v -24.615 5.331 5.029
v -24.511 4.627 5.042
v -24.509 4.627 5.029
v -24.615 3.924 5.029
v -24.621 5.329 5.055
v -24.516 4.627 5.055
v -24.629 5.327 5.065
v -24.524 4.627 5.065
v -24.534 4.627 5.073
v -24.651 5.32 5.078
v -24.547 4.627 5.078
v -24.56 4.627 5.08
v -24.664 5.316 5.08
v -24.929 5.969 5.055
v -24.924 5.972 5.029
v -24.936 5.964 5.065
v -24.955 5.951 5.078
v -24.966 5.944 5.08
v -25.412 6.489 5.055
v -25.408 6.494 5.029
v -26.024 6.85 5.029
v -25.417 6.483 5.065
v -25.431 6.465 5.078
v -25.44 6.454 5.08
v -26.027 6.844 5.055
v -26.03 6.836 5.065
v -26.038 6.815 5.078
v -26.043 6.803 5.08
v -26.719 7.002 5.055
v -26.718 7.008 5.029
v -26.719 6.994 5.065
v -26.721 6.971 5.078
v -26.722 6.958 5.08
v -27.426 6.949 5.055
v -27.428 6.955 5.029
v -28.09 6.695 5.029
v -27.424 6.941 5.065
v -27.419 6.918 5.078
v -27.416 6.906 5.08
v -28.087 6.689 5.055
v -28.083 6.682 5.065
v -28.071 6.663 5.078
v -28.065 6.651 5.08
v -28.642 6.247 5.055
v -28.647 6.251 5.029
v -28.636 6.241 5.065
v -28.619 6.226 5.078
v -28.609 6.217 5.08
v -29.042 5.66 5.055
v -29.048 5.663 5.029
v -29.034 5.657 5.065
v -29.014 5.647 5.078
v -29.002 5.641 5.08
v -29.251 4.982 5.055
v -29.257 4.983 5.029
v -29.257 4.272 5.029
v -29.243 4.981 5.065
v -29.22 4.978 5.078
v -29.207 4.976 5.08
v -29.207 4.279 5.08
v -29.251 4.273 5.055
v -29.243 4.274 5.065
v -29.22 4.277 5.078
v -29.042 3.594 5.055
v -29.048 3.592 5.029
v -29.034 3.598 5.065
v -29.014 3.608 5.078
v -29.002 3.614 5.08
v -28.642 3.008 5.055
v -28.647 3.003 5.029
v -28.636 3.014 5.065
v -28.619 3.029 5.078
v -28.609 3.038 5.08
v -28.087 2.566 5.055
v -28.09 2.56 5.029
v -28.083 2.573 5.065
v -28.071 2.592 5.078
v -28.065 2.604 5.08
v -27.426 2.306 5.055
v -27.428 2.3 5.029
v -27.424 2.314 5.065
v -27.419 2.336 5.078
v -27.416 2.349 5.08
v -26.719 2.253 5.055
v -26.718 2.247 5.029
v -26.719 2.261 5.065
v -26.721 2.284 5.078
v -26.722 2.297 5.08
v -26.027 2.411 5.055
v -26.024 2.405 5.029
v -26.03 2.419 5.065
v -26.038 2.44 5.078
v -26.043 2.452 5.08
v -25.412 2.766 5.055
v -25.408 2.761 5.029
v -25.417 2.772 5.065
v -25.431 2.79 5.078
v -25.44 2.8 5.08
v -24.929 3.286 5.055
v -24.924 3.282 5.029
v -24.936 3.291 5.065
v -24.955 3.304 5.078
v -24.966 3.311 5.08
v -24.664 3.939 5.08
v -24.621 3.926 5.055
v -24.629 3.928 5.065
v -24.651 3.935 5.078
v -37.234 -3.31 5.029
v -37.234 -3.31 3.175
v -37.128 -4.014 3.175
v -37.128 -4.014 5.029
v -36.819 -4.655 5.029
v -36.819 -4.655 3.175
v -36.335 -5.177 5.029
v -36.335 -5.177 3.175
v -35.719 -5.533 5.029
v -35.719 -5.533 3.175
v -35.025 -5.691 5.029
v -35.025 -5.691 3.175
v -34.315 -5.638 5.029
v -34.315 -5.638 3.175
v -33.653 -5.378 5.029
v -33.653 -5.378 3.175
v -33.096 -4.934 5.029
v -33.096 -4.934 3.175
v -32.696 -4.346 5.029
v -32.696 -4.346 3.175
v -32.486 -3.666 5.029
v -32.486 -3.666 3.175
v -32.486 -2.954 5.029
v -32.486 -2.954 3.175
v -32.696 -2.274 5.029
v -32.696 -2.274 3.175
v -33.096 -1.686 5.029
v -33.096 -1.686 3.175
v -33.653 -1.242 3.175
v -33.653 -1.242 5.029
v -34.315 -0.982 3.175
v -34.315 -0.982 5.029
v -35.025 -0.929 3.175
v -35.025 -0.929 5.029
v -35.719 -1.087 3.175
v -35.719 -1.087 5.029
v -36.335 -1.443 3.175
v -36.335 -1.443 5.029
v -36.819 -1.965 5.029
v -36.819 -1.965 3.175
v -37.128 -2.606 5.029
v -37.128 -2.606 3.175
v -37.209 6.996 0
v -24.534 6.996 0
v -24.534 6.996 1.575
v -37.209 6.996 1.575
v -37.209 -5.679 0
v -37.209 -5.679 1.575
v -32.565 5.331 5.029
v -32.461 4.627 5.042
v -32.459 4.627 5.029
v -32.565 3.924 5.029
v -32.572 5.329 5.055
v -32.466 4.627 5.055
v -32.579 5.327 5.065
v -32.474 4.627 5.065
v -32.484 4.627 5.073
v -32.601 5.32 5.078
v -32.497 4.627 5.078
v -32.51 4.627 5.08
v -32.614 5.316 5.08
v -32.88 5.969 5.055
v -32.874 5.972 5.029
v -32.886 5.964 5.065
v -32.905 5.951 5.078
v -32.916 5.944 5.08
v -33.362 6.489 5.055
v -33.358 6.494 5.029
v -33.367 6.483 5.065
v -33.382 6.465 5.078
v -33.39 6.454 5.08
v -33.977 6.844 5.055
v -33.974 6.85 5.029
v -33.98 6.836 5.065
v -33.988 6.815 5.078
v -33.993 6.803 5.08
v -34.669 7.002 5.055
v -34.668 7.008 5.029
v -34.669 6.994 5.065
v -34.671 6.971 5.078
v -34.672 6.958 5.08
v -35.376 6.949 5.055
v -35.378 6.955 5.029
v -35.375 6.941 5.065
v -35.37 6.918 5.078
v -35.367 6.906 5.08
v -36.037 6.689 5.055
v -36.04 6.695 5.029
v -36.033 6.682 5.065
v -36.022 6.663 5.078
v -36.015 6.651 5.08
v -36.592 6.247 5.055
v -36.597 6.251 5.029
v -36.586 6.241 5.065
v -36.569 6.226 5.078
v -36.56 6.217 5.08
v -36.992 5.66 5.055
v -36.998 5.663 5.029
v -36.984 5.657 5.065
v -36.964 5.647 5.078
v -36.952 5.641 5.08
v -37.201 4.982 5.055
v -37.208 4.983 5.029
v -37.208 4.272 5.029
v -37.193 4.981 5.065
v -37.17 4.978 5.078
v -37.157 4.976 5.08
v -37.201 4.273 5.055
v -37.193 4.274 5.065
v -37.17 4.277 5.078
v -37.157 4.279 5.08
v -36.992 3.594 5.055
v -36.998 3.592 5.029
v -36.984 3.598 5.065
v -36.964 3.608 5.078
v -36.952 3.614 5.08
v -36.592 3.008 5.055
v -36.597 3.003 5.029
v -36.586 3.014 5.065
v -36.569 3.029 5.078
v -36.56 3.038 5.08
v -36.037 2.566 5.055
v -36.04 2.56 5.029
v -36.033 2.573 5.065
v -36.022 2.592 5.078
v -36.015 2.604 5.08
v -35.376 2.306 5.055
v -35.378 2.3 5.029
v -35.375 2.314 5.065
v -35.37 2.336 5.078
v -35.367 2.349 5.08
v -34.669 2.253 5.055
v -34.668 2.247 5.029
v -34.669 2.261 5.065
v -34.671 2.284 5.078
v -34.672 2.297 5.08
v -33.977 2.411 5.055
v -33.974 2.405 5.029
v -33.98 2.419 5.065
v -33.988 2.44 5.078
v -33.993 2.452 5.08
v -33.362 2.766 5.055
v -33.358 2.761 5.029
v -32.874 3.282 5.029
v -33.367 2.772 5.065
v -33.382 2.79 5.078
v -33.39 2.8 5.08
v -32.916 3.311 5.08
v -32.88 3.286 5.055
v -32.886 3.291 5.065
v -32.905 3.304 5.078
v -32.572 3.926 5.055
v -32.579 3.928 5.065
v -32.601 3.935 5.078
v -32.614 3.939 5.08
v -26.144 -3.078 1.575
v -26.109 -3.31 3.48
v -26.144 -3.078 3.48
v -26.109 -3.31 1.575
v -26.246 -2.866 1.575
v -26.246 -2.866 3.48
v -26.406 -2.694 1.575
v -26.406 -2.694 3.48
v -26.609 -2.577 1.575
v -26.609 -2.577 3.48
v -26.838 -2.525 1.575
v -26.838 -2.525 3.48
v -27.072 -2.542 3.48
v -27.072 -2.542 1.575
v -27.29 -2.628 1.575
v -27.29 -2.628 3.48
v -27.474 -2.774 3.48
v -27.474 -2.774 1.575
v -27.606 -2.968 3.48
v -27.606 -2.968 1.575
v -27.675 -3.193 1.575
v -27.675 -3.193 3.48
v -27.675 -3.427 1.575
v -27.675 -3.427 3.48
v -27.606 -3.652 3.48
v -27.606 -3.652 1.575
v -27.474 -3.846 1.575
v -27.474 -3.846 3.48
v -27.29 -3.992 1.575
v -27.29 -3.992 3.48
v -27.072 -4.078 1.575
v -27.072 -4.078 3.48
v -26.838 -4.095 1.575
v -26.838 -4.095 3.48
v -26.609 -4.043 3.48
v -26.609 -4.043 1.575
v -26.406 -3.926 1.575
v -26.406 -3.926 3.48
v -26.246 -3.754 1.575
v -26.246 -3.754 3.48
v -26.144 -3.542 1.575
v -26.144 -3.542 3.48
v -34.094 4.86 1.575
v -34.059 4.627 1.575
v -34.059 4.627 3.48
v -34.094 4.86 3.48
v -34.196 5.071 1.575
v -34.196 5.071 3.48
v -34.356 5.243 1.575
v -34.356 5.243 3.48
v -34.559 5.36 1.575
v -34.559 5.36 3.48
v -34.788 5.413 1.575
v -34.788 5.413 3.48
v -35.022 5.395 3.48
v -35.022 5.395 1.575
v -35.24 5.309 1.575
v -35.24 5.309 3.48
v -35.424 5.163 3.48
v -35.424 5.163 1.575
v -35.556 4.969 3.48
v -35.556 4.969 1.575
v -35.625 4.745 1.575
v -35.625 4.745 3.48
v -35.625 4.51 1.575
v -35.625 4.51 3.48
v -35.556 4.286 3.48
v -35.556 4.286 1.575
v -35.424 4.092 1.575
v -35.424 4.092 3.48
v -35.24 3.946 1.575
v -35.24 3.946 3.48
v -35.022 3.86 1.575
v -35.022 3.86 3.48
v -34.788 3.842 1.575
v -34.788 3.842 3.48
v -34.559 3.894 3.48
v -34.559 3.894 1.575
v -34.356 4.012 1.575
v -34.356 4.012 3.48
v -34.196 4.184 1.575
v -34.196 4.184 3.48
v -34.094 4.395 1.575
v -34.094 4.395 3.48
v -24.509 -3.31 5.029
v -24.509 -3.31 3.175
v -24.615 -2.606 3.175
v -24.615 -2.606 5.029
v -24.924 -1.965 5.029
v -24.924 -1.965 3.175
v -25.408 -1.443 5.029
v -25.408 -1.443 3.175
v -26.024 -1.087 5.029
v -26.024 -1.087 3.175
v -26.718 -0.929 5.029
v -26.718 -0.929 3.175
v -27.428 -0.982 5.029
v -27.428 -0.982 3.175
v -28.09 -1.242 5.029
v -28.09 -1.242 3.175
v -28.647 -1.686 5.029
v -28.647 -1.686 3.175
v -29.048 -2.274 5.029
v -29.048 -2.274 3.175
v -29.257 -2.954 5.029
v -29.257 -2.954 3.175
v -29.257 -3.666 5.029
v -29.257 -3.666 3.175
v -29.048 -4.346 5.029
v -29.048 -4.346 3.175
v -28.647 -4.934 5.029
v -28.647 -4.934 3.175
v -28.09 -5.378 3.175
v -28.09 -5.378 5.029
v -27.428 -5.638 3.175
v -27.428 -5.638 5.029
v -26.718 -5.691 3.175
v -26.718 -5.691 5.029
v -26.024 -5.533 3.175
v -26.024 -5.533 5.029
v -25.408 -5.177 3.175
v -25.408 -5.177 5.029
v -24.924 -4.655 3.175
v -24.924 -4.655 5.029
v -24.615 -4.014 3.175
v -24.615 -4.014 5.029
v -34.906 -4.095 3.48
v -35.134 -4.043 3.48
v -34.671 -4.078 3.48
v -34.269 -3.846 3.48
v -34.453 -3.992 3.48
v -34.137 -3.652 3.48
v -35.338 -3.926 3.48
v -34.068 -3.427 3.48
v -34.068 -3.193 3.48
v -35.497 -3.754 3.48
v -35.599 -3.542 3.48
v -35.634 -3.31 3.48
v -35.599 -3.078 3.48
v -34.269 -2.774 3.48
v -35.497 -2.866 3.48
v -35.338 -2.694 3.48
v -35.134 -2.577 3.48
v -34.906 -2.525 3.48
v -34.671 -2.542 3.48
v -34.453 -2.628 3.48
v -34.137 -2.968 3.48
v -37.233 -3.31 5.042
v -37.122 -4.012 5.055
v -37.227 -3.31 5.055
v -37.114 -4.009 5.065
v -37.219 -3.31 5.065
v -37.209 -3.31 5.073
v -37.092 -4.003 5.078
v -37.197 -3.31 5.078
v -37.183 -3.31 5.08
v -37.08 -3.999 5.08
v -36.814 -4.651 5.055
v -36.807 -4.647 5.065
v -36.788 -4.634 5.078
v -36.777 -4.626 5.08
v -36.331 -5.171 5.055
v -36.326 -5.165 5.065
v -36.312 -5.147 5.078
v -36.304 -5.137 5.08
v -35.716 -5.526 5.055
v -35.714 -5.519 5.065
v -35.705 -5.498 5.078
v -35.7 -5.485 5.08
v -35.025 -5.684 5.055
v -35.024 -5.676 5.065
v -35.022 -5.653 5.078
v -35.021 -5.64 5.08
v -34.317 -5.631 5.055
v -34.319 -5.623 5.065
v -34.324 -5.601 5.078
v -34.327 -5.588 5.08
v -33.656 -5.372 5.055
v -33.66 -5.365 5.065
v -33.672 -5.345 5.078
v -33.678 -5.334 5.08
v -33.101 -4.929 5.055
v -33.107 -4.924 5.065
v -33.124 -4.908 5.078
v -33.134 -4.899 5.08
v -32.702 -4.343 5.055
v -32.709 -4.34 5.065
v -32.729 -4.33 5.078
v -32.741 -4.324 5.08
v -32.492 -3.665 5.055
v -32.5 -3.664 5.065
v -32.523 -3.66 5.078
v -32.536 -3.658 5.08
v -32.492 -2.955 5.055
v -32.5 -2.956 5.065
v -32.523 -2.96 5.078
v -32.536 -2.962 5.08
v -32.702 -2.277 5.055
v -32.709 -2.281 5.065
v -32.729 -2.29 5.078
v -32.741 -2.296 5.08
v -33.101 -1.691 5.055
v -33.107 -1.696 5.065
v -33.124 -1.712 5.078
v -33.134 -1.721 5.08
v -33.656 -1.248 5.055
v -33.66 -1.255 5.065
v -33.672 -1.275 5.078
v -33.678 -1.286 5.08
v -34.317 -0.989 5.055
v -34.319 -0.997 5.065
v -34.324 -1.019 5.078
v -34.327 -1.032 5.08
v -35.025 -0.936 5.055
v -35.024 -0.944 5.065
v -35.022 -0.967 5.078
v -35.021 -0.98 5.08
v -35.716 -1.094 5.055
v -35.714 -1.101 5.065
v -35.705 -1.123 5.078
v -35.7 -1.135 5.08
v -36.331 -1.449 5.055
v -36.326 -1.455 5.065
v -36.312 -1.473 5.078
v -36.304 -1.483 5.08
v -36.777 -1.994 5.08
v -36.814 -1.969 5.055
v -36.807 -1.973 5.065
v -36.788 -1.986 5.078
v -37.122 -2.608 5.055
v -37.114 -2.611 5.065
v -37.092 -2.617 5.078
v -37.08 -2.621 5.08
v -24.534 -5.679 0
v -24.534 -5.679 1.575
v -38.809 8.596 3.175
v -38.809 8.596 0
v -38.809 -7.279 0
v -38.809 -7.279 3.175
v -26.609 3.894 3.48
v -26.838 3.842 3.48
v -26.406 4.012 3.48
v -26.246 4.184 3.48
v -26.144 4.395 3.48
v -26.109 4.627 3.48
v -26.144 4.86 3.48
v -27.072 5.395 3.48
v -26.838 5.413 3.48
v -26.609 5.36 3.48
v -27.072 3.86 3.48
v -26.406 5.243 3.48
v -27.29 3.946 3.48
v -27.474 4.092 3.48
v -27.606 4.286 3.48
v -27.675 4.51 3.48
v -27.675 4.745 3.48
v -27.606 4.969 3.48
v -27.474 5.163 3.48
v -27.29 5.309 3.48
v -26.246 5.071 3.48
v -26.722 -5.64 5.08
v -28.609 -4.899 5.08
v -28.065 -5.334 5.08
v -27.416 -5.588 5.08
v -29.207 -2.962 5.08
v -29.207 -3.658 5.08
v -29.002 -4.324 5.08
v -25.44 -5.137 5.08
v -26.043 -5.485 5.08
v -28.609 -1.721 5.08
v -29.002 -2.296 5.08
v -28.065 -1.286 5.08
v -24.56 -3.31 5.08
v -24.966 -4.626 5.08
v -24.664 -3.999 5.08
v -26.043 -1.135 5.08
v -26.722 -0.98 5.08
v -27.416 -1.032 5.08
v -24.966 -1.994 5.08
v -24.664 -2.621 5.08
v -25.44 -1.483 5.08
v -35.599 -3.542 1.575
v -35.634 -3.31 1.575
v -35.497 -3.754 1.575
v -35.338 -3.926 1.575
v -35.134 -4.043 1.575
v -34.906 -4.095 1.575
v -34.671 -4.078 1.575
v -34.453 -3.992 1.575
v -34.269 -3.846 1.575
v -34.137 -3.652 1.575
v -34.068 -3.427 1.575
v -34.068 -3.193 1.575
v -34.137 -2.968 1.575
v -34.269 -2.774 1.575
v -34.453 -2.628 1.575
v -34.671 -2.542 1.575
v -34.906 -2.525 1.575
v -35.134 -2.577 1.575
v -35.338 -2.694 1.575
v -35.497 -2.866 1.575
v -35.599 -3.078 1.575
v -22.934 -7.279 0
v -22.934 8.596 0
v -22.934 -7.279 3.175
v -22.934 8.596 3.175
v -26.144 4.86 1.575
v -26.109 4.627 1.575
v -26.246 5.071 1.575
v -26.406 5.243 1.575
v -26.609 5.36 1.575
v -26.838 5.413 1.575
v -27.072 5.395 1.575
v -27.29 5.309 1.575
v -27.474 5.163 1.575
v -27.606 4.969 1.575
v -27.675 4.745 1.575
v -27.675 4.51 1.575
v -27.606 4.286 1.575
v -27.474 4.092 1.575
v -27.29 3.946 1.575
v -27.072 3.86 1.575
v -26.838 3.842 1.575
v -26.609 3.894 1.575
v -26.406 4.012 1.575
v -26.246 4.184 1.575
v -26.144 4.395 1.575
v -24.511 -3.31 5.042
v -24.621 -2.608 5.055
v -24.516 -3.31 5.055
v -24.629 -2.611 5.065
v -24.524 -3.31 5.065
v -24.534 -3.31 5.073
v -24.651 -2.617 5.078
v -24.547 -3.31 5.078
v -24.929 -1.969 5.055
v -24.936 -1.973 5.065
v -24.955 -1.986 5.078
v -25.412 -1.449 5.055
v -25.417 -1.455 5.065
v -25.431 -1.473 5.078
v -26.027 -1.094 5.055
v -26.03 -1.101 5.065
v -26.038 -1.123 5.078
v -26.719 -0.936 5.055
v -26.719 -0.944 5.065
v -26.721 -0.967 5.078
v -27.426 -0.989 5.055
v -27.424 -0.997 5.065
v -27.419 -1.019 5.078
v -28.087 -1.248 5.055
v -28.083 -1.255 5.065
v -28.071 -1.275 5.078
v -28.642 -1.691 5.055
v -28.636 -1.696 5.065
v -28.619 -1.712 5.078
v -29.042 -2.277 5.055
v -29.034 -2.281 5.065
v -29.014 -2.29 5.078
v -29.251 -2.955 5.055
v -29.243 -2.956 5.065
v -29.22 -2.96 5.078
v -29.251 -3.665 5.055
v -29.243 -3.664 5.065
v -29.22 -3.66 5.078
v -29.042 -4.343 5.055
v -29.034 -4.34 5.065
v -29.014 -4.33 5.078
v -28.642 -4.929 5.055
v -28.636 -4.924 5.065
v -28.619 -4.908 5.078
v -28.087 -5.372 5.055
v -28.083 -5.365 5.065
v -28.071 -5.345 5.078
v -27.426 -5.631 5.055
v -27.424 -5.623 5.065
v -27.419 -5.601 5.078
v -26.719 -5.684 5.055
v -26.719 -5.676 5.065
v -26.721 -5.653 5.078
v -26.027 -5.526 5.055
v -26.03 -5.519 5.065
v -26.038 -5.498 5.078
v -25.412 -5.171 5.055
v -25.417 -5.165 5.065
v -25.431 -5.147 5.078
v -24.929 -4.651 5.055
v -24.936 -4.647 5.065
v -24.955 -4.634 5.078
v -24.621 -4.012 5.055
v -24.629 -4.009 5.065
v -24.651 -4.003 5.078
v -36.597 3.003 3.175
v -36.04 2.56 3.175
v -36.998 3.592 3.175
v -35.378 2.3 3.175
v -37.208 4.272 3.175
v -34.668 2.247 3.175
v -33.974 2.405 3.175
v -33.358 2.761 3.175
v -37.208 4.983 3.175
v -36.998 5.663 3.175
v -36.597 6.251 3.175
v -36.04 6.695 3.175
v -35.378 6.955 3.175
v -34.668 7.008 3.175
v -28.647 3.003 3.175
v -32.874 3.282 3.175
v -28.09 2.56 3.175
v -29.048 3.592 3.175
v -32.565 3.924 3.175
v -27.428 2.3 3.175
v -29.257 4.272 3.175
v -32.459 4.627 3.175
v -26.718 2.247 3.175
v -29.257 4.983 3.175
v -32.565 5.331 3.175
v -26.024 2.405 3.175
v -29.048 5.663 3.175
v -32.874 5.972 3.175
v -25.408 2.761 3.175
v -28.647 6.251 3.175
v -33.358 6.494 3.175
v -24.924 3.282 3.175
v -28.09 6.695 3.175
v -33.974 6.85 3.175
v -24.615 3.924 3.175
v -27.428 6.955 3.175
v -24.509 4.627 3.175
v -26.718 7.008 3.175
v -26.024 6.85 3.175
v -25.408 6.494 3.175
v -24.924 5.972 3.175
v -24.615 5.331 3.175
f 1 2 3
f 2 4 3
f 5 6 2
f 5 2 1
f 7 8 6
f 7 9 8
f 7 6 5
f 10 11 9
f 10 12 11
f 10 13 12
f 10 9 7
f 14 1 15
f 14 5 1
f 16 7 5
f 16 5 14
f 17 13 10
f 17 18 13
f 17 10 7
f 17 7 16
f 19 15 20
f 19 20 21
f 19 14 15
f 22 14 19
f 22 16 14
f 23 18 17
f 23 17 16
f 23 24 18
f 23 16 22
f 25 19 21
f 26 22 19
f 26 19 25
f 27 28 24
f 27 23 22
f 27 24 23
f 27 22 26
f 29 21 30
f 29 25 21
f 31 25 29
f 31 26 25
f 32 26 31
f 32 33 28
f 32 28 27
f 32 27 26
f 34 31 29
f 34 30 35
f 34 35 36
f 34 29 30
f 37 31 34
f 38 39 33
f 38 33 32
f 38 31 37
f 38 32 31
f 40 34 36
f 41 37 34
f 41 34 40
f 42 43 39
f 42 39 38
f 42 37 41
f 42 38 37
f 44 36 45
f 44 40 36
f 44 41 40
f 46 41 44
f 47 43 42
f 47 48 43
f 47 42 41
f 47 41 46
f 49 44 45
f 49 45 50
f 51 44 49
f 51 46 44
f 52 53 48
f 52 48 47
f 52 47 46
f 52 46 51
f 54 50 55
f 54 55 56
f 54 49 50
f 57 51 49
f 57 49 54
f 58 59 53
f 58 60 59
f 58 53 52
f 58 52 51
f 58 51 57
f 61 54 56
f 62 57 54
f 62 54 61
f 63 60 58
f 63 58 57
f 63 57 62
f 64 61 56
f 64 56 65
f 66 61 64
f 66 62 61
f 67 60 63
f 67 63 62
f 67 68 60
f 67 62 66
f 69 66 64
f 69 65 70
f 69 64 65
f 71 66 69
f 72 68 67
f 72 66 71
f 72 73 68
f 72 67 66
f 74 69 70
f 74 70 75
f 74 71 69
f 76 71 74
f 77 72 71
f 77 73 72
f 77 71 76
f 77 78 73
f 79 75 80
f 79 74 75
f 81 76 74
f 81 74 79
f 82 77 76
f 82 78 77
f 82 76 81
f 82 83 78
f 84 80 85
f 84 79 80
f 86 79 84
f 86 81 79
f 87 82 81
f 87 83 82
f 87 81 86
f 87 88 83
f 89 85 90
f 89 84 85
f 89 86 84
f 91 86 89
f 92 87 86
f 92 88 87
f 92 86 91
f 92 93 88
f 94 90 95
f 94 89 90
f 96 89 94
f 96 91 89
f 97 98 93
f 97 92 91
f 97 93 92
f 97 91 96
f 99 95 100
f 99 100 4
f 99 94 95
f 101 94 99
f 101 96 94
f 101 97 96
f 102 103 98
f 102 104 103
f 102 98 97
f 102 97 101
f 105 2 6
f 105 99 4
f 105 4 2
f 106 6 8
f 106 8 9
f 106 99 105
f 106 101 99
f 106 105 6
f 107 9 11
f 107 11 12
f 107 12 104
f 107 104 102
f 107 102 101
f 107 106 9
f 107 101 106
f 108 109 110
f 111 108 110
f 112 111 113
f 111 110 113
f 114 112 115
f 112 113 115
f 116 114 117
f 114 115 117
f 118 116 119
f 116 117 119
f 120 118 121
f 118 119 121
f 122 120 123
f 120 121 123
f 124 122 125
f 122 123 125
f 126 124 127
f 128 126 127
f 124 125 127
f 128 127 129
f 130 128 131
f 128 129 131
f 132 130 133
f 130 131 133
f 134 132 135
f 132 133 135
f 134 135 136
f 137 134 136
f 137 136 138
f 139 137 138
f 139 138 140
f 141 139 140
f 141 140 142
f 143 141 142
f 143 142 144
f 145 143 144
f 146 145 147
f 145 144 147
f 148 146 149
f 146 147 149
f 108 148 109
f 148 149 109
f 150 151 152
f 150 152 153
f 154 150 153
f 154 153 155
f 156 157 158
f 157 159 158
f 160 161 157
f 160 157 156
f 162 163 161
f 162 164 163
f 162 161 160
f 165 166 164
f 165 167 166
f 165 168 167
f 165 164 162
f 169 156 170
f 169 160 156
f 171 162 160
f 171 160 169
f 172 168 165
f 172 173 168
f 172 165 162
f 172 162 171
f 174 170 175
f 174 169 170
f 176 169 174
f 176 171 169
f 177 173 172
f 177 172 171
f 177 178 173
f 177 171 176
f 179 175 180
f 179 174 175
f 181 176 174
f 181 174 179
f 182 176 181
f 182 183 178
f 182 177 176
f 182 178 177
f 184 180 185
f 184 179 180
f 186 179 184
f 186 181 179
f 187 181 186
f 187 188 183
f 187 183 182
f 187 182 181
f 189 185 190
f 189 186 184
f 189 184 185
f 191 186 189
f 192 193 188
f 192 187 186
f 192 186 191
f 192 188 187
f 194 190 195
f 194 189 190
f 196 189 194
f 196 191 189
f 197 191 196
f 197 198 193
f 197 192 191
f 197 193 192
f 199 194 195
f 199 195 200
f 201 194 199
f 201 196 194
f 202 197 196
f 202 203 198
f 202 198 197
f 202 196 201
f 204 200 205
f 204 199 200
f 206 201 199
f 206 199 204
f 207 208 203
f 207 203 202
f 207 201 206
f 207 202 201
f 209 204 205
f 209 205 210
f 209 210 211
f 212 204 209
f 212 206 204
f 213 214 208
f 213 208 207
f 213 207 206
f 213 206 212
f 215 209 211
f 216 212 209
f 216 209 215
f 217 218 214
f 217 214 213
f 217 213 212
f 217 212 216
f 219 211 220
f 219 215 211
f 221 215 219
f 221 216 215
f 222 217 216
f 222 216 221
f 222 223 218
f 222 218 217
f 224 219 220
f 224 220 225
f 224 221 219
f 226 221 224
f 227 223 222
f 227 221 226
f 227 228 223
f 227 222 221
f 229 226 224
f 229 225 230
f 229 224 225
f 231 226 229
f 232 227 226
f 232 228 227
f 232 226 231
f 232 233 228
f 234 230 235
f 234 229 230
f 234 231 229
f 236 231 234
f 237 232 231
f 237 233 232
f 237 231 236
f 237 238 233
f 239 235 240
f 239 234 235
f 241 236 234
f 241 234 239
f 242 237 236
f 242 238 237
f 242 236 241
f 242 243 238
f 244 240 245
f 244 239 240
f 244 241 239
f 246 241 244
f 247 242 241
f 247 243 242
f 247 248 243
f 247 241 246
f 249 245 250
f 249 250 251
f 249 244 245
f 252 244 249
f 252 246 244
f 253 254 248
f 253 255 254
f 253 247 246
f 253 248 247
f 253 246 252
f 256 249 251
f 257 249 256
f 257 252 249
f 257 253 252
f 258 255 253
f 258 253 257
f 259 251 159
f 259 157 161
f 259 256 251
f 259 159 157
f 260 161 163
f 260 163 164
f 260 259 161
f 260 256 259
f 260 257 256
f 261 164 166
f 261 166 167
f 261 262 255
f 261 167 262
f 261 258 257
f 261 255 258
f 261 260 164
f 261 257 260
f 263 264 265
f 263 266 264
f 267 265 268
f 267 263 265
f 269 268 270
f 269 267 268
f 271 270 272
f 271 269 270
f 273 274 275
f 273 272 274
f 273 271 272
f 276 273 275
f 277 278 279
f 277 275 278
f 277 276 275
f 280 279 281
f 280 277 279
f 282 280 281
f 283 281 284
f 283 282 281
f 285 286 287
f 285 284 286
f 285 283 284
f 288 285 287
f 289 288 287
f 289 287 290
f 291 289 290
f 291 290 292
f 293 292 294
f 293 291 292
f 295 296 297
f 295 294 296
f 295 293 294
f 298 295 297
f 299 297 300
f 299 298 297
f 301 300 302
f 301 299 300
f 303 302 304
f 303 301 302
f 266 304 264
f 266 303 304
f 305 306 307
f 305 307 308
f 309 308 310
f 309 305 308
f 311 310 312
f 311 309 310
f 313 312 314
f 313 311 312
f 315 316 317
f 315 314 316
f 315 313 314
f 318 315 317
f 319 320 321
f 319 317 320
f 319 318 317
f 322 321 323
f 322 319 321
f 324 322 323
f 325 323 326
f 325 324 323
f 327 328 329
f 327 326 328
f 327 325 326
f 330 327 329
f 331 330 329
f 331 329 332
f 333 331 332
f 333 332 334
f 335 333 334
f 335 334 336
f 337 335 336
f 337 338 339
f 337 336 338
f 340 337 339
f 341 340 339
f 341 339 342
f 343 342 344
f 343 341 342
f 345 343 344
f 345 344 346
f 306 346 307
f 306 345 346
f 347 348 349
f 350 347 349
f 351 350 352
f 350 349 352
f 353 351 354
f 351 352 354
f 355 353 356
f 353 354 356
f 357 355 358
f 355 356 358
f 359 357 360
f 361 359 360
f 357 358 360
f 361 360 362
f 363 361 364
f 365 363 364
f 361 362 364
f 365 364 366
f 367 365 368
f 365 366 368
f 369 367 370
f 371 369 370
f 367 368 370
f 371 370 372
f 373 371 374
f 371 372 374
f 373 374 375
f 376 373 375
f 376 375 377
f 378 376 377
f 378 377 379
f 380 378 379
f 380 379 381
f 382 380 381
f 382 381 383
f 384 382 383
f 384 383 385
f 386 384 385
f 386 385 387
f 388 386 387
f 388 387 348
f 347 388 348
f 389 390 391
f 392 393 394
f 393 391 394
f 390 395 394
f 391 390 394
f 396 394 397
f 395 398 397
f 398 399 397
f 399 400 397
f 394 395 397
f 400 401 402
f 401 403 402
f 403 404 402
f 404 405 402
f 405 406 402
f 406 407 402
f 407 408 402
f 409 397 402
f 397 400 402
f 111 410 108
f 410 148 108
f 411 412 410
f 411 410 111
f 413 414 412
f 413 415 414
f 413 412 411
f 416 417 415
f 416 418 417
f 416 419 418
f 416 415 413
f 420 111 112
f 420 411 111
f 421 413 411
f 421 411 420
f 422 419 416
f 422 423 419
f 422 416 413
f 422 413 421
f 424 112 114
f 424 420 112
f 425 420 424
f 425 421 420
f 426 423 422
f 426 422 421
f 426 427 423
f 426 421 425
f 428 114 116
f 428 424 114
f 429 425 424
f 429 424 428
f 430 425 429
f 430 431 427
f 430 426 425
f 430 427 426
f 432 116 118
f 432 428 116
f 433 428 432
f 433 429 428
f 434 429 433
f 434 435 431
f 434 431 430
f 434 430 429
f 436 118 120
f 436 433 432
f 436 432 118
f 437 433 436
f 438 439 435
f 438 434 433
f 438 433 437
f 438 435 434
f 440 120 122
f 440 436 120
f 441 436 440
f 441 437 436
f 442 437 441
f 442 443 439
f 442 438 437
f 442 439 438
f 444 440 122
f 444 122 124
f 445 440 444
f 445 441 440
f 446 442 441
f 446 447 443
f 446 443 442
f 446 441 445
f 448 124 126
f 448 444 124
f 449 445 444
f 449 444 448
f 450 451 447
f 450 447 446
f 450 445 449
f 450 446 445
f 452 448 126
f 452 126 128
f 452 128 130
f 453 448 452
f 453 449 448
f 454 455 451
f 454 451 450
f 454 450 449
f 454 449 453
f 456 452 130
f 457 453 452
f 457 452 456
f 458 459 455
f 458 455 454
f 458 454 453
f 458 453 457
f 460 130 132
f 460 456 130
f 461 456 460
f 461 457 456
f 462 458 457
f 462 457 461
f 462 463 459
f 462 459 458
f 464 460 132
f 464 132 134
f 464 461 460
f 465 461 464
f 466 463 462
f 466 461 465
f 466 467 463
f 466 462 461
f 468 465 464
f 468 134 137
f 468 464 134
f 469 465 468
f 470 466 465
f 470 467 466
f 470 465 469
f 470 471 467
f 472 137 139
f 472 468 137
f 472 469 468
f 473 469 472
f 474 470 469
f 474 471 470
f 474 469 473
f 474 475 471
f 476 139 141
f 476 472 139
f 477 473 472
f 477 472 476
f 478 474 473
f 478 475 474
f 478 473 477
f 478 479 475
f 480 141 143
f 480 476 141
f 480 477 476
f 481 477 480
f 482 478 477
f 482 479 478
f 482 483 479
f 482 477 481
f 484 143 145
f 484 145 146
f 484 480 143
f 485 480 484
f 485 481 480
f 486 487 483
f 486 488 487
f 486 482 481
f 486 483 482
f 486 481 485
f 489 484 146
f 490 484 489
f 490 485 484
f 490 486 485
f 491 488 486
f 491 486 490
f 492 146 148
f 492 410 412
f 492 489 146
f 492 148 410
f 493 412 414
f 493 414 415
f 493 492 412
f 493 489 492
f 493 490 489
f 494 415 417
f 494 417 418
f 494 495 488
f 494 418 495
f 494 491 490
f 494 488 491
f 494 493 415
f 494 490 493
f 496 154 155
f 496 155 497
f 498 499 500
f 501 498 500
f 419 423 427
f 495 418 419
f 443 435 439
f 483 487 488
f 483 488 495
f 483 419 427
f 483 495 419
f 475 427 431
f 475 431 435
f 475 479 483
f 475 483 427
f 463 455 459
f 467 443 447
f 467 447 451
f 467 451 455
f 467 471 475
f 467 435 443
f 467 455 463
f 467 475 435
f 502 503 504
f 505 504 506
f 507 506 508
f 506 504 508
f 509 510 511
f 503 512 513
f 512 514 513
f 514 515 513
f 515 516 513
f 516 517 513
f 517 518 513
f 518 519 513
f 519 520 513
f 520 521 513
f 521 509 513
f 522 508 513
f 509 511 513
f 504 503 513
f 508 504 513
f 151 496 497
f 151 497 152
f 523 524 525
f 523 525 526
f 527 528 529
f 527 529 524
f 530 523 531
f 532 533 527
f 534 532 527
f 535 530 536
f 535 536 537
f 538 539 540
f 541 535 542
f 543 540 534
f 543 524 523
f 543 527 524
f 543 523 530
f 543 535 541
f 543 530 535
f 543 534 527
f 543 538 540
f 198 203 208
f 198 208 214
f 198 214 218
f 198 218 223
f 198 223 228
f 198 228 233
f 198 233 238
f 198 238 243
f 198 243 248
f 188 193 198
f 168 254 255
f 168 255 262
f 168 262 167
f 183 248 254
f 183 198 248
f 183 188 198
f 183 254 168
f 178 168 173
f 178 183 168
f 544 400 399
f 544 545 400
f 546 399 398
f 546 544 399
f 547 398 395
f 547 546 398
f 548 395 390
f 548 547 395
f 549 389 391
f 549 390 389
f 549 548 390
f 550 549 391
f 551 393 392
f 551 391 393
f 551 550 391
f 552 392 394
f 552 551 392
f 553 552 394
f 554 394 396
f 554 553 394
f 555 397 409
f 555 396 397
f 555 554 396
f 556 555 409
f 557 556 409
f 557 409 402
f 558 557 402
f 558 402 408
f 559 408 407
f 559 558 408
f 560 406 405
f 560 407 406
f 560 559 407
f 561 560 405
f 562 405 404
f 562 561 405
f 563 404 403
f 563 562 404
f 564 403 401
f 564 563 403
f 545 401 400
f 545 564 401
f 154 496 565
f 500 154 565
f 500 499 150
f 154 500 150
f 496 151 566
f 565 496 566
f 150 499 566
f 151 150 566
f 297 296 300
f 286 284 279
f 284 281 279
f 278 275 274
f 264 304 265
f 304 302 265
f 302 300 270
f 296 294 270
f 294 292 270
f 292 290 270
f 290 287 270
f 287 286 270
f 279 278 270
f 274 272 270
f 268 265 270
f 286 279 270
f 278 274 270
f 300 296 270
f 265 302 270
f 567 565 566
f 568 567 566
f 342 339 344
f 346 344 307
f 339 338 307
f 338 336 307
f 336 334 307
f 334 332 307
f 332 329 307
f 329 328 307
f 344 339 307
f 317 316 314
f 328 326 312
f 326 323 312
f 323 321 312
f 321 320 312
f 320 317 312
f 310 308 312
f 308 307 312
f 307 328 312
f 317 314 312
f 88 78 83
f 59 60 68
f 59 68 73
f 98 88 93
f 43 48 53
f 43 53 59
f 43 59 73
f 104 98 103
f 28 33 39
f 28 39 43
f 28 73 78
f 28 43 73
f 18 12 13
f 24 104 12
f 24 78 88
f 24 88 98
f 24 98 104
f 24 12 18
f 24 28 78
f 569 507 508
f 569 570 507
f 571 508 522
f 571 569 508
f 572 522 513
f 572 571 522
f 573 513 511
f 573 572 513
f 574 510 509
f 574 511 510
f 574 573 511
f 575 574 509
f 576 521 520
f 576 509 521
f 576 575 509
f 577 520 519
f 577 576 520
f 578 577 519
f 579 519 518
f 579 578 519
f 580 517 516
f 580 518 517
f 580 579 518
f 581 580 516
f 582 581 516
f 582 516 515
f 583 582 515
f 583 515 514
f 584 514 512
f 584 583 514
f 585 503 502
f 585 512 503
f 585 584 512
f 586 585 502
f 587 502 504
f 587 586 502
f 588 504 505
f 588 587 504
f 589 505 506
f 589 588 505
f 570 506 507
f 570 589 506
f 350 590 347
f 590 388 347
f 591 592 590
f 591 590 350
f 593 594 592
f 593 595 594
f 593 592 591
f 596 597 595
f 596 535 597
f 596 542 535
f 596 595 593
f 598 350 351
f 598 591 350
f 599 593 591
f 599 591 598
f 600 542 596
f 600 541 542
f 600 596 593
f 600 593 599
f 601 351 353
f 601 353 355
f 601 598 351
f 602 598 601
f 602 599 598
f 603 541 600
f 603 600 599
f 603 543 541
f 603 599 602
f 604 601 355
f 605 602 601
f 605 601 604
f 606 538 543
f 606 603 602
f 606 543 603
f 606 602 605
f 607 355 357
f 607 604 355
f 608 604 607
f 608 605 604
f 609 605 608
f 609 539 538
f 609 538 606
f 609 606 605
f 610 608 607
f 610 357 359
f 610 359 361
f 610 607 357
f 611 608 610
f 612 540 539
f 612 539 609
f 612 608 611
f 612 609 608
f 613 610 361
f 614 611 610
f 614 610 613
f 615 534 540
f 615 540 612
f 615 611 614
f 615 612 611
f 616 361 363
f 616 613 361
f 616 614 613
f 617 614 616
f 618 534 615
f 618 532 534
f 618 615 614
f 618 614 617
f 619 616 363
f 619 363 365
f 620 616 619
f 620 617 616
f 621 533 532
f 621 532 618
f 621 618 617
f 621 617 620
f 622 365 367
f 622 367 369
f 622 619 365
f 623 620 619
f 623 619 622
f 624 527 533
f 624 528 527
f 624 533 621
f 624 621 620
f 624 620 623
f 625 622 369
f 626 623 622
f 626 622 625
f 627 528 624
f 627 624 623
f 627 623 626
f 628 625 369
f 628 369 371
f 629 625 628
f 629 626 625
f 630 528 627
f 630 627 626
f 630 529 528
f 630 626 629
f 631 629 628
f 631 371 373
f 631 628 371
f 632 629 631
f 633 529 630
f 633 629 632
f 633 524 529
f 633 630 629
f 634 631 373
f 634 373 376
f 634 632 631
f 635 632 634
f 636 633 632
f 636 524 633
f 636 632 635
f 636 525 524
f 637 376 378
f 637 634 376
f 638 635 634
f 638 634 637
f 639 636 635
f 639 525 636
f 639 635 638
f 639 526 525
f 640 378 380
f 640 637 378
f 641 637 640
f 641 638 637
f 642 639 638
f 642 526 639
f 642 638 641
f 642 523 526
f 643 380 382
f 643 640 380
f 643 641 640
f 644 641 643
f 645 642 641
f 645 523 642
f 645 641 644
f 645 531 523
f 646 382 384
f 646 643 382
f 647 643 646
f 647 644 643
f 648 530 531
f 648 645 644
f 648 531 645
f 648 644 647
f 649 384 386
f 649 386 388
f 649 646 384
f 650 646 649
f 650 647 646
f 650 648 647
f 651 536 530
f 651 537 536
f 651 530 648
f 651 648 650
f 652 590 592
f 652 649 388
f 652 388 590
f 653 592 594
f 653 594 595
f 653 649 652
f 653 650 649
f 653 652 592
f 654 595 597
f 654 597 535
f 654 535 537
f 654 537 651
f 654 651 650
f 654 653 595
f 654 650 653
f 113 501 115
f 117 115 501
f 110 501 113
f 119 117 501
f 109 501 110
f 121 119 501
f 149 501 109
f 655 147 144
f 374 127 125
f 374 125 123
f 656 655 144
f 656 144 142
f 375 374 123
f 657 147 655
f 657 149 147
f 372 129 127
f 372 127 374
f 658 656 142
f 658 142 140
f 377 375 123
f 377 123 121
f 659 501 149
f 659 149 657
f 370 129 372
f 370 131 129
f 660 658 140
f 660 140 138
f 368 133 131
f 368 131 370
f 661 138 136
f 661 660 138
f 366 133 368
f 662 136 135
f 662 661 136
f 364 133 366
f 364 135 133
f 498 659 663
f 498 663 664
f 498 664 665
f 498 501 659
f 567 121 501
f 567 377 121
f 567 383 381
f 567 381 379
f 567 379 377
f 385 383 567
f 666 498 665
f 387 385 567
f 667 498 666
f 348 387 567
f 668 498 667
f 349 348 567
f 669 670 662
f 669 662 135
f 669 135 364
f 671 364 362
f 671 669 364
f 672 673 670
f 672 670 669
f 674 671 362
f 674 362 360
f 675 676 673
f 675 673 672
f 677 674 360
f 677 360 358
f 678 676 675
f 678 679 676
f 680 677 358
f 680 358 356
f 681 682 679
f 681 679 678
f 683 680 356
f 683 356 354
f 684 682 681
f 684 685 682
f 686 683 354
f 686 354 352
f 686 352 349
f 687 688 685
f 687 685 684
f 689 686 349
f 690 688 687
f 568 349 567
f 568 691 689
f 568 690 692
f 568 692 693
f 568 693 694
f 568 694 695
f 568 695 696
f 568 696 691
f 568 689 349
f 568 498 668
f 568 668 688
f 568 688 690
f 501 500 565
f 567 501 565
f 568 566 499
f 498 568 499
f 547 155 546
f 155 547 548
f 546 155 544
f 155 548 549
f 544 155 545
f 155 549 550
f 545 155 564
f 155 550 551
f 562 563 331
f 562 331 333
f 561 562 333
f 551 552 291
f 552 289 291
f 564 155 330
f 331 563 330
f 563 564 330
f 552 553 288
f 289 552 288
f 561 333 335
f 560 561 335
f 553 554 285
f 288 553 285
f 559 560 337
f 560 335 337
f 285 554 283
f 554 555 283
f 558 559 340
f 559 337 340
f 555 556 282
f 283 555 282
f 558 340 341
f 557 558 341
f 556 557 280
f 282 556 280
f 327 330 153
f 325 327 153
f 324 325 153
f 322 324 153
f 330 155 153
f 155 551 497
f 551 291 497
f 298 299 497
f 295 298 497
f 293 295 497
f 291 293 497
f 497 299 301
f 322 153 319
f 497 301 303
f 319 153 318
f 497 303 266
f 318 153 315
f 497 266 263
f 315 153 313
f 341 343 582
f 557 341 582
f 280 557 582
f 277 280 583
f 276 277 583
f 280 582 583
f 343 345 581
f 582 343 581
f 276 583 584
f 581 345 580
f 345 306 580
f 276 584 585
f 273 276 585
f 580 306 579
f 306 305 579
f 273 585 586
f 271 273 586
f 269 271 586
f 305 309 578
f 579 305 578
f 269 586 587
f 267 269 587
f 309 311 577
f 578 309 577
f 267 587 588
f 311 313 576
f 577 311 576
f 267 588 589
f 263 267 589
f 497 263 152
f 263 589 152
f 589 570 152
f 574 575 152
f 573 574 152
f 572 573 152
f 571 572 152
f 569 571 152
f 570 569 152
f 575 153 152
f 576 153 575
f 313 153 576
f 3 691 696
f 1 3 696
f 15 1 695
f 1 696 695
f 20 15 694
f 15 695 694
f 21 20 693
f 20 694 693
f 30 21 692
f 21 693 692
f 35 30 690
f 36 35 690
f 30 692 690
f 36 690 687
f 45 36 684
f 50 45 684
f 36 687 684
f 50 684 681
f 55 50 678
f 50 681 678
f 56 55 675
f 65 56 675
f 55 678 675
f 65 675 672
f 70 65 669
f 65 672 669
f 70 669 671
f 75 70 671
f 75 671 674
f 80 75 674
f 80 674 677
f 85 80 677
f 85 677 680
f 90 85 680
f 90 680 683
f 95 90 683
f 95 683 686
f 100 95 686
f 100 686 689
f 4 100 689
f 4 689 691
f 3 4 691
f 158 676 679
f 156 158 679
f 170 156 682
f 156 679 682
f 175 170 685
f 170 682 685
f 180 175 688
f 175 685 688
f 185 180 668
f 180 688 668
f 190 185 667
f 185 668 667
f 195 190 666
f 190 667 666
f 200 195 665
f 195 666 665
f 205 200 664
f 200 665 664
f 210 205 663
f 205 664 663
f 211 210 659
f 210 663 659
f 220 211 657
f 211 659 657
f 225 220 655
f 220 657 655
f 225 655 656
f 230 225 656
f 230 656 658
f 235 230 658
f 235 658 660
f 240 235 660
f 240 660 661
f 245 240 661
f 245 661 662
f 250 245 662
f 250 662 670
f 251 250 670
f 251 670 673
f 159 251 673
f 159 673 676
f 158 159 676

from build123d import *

# Parameters (mm, degrees)
F1_DEPTH = 3.175
F2_DEPTH = 5.08
F3_T     = -1.6002
F4_R     = 0.0508


# Not quite as in the source:
# - a feature names something its author has since deleted; it is built from what else it names


with BuildPart() as f1:
    # F0 (on Top) → F1 (new body)
    with BuildSketch(Plane.XY):
        with BuildLine():
            Line((-22.9340831819, 8.5962191019), (-38.8090831819, 8.5962191019))
            Line((-38.8090831819, 8.5962191019), (-38.8090831819, 4.6274691019))
            Line((-38.8090831819, 4.6274691019), (-37.2342831819, 4.6274691019))
            ThreePointArc((-37.2342831819, 4.6274691019), (-34.8466831819, 7.0150691019), (-32.4590831819, 4.6274691019))
            Line((-32.4590831819, 4.6274691019), (-29.2840831819, 4.6274691019))
            ThreePointArc((-29.2840831819, 4.6274691019), (-26.8964831819, 7.0150691019), (-24.5088831819, 4.6274691019))
            Line((-24.5088831819, 4.6274691019), (-22.9340831819, 4.6274691019))
            Line((-22.9340831819, 4.6274691019), (-22.9340831819, 8.5962191019))
        make_face()
        with BuildLine():
            Line((-37.2342831819, 4.6274691019), (-38.8090831819, 4.6274691019))
            Line((-38.8090831819, 4.6274691019), (-38.8090831819, 0.6587191019))
            Line((-38.8090831819, 0.6587191019), (-22.9340831819, 0.6587191019))
            Line((-22.9340831819, 0.6587191019), (-22.9340831819, 4.6274691019))
            Line((-22.9340831819, 4.6274691019), (-24.5088831819, 4.6274691019))
            ThreePointArc((-24.5088831819, 4.6274691019), (-26.8964831819, 2.2398691019), (-29.2840831819, 4.6274691019))
            Line((-29.2840831819, 4.6274691019), (-32.4590831819, 4.6274691019))
            ThreePointArc((-32.4590831819, 4.6274691019), (-34.8466831819, 2.2398691019), (-37.2342831819, 4.6274691019))
        make_face()
        with BuildLine():
            Line((-37.2342831819, -3.3100308981), (-38.8090831819, -3.3100308981))
            Line((-38.8090831819, -3.3100308981), (-38.8090831819, -7.2787808981))
            Line((-38.8090831819, -7.2787808981), (-22.9340831819, -7.2787808981))
            Line((-22.9340831819, -7.2787808981), (-22.9340831819, -3.3100308981))
            Line((-22.9340831819, -3.3100308981), (-24.5088831819, -3.3100308981))
            ThreePointArc((-24.5088831819, -3.3100308981), (-26.8964831819, -5.6976308981), (-29.2840831819, -3.3100308981))
            Line((-29.2840831819, -3.3100308981), (-32.4590831819, -3.3100308981))
            ThreePointArc((-32.4590831819, -3.3100308981), (-34.8466831819, -5.6976308981), (-37.2342831819, -3.3100308981))
        make_face()
        with BuildLine():
            Line((-22.9340831819, 0.6587191019), (-38.8090831819, 0.6587191019))
            Line((-38.8090831819, 0.6587191019), (-38.8090831819, -3.3100308981))
            Line((-38.8090831819, -3.3100308981), (-37.2342831819, -3.3100308981))
            ThreePointArc((-37.2342831819, -3.3100308981), (-34.8466831819, -0.9224308981), (-32.4590831819, -3.3100308981))
            Line((-32.4590831819, -3.3100308981), (-29.2840831819, -3.3100308981))
            ThreePointArc((-29.2840831819, -3.3100308981), (-26.8964831819, -0.9224308981), (-24.5088831819, -3.3100308981))
            Line((-24.5088831819, -3.3100308981), (-22.9340831819, -3.3100308981))
            Line((-22.9340831819, -3.3100308981), (-22.9340831819, 0.6587191019))
        make_face()
    extrude(amount=F1_DEPTH)

    # F0 (on Top) → F2 (join)
    with BuildSketch(Plane.XY):
        with BuildLine():
            Line((-32.4590831819, 4.6274691019), (-37.2342831819, 4.6274691019))
            ThreePointArc((-37.2342831819, 4.6274691019), (-34.8466831819, 2.2398691019), (-32.4590831819, 4.6274691019))
        make_face()
        with BuildLine():
            ThreePointArc((-32.4590831819, 4.6274691019), (-34.8466831819, 7.0150691019), (-37.2342831819, 4.6274691019))
            Line((-37.2342831819, 4.6274691019), (-32.4590831819, 4.6274691019))
        make_face()
        with BuildLine():
            ThreePointArc((-32.4590831819, -3.3100308981), (-34.8466831819, -0.9224308981), (-37.2342831819, -3.3100308981))
            Line((-37.2342831819, -3.3100308981), (-32.4590831819, -3.3100308981))
        make_face()
        with BuildLine():
            Line((-32.4590831819, -3.3100308981), (-37.2342831819, -3.3100308981))
            ThreePointArc((-37.2342831819, -3.3100308981), (-34.8466831819, -5.6976308981), (-32.4590831819, -3.3100308981))
        make_face()
        with BuildLine():
            ThreePointArc((-29.2840831819, -3.3100308981), (-26.8964831819, -5.6976308981), (-24.5088831819, -3.3100308981))
            Line((-24.5088831819, -3.3100308981), (-29.2840831819, -3.3100308981))
        make_face()
        with BuildLine():
            Line((-29.2840831819, -3.3100308981), (-24.5088831819, -3.3100308981))
            ThreePointArc((-24.5088831819, -3.3100308981), (-26.8964831819, -0.9224308981), (-29.2840831819, -3.3100308981))
        make_face()
        with BuildLine():
            ThreePointArc((-29.2840831819, 4.6274691019), (-26.8964831819, 2.2398691019), (-24.5088831819, 4.6274691019))
            Line((-24.5088831819, 4.6274691019), (-29.2840831819, 4.6274691019))
        make_face()
        with BuildLine():
            Line((-29.2840831819, 4.6274691019), (-24.5088831819, 4.6274691019))
            ThreePointArc((-24.5088831819, 4.6274691019), (-26.8964831819, 7.0150691019), (-29.2840831819, 4.6274691019))
        make_face()
    extrude(amount=F2_DEPTH)

    # F3
    f3_openings = [f1.faces().sort_by_distance(p)[0] for p in [
        (-30.871583, 0.658719, 0),
    ]]
    offset(amount=F3_T, openings=f3_openings, kind=Kind.INTERSECTION)

    # F4
    f4_edges = [f1.edges().sort_by_distance(p)[0] for p in [
        (-32.459083, -3.310031, 5.08),
        (-29.284083, -3.310031, 5.08),
        (-29.284083, 4.627469, 5.08),
        (-37.234283, 4.627469, 5.08),
    ]]
    fillet(f4_edges, radius=F4_R)


solid = f1.part
